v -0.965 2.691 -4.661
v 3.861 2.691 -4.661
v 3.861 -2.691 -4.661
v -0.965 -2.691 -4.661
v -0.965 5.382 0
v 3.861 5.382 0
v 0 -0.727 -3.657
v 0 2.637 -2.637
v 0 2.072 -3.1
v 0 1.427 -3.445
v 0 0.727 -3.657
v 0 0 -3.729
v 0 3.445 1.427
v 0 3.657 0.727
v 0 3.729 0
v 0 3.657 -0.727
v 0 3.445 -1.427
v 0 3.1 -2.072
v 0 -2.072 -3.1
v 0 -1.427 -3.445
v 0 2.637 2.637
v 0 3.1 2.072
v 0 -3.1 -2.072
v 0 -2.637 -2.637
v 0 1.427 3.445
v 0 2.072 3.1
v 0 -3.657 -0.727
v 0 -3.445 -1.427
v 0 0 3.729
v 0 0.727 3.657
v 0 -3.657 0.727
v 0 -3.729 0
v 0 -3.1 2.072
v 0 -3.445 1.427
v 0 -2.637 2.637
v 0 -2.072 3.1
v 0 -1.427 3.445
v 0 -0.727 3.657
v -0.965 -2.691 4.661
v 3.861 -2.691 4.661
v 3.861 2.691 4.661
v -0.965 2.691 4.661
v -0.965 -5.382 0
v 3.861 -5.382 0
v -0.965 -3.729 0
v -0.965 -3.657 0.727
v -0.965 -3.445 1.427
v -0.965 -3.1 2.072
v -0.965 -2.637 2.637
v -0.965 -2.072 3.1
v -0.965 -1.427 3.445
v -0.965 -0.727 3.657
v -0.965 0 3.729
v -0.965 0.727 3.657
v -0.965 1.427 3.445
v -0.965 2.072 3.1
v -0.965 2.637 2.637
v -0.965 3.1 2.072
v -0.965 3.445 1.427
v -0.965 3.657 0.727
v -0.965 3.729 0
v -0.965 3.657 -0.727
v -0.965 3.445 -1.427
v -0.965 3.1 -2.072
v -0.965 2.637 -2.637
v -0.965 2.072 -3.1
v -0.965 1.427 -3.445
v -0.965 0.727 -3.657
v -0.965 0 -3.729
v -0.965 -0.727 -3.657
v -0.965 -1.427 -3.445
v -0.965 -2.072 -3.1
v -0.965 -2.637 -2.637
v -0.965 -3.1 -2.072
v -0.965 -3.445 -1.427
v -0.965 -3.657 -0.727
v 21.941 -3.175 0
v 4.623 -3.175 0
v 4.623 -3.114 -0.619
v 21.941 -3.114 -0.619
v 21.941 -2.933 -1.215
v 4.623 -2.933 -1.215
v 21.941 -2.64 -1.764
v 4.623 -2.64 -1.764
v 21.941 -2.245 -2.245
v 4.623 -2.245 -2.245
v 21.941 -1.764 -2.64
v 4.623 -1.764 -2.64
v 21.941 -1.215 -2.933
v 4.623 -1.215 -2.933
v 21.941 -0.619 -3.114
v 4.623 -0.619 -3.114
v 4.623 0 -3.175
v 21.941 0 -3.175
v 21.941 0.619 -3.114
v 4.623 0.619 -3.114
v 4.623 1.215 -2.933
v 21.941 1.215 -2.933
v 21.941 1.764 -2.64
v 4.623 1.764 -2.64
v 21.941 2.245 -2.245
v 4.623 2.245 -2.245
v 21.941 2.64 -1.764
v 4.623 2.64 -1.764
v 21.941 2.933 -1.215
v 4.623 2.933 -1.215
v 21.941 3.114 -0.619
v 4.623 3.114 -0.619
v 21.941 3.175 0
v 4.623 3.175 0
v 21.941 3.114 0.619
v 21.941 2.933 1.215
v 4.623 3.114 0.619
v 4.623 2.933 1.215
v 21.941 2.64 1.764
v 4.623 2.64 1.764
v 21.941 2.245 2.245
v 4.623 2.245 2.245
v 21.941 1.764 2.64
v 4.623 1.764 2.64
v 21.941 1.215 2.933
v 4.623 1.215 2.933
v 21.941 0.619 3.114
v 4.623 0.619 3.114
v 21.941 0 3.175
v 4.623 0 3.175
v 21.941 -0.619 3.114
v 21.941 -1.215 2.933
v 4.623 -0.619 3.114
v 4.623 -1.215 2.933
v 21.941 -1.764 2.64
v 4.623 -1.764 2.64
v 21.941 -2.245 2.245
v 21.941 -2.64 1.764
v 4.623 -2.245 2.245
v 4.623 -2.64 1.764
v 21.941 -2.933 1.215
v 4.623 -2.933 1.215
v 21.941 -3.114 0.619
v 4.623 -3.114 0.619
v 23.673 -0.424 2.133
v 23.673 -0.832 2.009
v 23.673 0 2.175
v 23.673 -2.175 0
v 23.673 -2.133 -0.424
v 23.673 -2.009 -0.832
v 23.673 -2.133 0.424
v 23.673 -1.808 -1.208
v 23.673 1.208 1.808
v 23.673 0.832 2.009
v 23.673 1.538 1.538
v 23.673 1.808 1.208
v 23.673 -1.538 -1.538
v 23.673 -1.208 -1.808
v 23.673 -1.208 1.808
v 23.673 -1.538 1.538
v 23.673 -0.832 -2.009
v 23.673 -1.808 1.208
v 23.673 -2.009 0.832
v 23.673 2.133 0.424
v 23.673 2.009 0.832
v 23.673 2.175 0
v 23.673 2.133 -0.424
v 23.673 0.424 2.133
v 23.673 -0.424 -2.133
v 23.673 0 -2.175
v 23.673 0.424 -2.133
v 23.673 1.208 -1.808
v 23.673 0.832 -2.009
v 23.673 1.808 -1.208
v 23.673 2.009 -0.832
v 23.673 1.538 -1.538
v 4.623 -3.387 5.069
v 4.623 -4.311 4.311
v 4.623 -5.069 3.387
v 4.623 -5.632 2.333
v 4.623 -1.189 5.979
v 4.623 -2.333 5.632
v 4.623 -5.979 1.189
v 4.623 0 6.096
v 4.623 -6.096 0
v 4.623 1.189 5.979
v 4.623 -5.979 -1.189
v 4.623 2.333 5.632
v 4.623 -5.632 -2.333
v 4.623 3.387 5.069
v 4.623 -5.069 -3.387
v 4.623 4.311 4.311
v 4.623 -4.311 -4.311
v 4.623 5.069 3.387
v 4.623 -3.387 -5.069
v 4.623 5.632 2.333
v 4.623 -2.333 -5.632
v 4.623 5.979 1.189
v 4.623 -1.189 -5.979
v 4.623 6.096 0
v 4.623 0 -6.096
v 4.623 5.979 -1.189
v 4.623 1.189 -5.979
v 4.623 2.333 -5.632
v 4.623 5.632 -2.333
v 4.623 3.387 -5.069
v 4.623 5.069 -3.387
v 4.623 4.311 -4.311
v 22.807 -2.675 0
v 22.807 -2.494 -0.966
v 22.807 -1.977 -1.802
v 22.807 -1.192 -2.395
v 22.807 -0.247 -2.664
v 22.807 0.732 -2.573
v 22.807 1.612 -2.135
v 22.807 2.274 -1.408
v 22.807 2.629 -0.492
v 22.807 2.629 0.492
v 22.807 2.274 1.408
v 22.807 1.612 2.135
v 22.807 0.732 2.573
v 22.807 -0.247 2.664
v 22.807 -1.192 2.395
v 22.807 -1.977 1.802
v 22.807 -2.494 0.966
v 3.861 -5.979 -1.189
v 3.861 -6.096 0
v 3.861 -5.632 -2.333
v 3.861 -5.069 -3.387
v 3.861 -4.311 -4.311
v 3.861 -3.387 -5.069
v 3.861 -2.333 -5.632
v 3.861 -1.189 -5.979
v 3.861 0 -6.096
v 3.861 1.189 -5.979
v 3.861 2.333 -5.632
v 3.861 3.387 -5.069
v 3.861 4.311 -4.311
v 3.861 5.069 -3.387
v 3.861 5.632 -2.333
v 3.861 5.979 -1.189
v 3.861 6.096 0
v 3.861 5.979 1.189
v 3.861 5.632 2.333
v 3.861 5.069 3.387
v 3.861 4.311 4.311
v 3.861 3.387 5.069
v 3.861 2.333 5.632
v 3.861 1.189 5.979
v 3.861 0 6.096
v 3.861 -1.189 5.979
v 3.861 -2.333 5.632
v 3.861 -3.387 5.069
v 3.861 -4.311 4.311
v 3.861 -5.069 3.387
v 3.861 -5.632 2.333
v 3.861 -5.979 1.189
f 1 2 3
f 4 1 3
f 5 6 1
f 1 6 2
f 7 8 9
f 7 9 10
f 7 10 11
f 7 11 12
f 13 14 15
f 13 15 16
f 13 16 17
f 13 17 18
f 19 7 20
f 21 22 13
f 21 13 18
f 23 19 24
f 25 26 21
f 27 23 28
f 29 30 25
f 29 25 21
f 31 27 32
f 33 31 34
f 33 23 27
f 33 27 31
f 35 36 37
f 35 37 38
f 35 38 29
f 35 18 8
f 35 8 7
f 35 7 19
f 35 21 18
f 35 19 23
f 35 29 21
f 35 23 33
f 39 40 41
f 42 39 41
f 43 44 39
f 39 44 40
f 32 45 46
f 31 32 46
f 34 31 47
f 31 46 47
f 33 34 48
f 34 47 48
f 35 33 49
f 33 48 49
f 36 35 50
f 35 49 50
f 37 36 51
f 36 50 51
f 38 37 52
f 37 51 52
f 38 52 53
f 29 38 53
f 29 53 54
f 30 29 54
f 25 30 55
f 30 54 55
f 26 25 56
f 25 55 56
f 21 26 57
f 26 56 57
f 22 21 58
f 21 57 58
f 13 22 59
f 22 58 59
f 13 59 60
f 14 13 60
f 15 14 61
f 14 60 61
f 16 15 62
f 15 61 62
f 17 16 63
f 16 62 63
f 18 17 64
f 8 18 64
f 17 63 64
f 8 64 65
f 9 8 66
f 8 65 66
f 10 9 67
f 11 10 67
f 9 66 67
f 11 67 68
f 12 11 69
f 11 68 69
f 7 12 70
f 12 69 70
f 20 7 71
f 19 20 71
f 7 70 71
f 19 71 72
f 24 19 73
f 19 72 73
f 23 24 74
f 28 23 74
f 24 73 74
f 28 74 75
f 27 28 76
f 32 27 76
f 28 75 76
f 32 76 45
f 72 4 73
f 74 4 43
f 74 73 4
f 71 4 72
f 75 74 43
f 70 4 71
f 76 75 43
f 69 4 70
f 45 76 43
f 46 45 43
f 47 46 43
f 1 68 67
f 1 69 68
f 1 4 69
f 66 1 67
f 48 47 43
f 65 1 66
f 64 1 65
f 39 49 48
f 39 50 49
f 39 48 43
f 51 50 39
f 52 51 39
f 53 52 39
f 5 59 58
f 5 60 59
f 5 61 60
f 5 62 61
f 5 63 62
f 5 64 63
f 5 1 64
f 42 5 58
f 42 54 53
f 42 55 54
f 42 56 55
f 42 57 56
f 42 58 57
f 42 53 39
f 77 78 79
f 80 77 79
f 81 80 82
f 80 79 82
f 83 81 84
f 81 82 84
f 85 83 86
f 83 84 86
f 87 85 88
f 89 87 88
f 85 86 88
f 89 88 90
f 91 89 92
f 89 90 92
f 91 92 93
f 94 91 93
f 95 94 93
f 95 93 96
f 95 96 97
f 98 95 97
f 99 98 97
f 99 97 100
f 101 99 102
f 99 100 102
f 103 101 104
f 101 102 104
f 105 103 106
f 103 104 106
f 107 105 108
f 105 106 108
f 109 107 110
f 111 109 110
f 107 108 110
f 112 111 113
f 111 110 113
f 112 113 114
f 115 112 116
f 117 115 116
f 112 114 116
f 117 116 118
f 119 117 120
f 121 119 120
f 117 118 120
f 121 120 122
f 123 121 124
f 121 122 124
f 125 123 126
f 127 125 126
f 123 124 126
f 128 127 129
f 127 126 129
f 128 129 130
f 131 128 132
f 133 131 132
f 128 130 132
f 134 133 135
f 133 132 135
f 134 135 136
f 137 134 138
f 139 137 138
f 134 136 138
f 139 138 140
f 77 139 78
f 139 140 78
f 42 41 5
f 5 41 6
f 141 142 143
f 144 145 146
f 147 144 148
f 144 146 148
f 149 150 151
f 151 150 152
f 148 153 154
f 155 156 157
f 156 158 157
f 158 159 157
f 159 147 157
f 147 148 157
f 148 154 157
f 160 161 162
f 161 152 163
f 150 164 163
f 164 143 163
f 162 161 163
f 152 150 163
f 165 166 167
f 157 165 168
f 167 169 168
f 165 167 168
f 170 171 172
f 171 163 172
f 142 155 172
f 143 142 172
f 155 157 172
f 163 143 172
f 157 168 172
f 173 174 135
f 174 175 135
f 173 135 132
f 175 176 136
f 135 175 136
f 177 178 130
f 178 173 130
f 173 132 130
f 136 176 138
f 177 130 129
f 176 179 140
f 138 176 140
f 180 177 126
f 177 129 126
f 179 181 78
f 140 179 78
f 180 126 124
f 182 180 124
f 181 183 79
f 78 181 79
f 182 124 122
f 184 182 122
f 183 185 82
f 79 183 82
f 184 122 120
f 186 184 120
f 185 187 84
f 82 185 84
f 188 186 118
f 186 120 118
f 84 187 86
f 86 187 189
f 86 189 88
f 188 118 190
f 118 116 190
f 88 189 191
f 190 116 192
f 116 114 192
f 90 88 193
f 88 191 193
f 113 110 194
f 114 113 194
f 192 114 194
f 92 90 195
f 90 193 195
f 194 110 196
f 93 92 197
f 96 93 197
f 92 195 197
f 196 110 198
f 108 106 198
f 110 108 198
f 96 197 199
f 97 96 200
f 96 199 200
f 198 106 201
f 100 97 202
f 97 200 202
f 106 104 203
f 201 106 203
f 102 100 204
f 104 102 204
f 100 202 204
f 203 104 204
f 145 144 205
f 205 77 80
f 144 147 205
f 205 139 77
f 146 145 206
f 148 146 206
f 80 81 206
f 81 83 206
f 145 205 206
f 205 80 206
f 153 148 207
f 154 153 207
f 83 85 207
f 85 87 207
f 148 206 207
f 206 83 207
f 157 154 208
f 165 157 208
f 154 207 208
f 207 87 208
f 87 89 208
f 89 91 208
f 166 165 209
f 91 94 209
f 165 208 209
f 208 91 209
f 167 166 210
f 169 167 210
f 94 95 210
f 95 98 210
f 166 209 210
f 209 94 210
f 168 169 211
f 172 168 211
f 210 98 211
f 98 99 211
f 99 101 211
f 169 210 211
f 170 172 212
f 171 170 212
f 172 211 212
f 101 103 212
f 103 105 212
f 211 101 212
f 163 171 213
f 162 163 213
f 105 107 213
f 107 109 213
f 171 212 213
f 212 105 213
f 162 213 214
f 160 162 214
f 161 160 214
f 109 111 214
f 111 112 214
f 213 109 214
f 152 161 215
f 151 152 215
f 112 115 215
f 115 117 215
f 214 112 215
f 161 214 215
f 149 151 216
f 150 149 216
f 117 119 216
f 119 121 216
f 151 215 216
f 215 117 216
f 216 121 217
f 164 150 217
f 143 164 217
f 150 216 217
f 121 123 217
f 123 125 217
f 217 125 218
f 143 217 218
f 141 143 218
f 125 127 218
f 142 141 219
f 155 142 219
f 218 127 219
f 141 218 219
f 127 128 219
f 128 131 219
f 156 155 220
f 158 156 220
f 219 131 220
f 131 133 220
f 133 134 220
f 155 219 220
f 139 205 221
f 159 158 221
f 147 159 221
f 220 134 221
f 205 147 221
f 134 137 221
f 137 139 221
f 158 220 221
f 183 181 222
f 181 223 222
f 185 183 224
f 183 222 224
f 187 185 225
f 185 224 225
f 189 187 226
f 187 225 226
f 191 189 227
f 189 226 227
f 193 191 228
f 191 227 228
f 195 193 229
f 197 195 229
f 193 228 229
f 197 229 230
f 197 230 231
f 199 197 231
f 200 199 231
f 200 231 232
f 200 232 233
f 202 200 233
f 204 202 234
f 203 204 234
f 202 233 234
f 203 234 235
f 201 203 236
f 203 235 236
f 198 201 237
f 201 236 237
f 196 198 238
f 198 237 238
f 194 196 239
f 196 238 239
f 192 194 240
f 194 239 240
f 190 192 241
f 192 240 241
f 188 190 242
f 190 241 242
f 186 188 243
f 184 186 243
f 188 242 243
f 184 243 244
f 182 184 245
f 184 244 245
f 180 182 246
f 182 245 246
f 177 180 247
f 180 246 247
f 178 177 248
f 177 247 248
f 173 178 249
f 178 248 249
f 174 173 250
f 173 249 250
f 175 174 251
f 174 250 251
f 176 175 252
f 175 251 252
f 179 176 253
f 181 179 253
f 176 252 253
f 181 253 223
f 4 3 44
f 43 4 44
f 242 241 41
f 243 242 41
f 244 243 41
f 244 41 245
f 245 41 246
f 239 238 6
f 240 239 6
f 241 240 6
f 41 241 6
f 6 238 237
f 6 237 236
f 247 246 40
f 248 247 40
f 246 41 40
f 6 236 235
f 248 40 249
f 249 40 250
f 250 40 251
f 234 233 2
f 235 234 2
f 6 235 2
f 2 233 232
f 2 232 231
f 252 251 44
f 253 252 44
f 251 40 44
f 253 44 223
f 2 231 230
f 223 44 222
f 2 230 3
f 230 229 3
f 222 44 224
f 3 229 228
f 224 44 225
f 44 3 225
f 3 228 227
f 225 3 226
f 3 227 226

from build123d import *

# Parameters (mm, degrees)
BOSS_EXTRUDE1_DEPTH = 4.826
SKETCH3_R           = 3.72872
CUT_EXTRUDE1_DEPTH  = 0.9652
CHAMFER1_SIZE       = 1
CHAMFER1_SIZE2      = 1.732050808


with BuildPart() as part:
    # Sketch1 → Revolve1 (revolve)
    with BuildSketch(Plane.XY, mode=Mode.PRIVATE) as revolve1_sk:
        Polygon((4.6228, 6.096), (3.8608, 6.096), (3.8608, 4.6609), (-0.9652, 4.6609), (-0.9652, 0), (0, 0), (4.6228, 0), (23.6728, 0), (23.6728, 3.175), (4.6228, 3.175), align=None)
    revolve(revolve1_sk.sketch.rotate(Axis((4.6228, 0, 0), (1, 0, 0)), 180), axis=Axis((4.6228, 0, 0), (1, 0, 0)))

    # Sketch2 → Boss-Extrude1 (add)
    with BuildSketch(Plane.ZY.offset(-3.8608)):
        Polygon((0, 5.381943739), (-4.6609, 2.69097187), (-4.6609, -2.69097187), (0, -5.381943739), (4.6609, -2.69097187), (4.6609, 2.69097187), align=None)
    extrude(amount=BOSS_EXTRUDE1_DEPTH)

    # Sketch3 → Cut-Extrude1 (cut)
    with BuildSketch(Plane.ZY.offset(0.9652)):
        with Locations(Location((0, 0, 0), (0, 0, 270))):
            Circle(SKETCH3_R)
    extrude(amount=-CUT_EXTRUDE1_DEPTH, mode=Mode.SUBTRACT)

    # Chamfer1
    chamfer1_edges = [part.edges().sort_by_distance(p)[0] for p in [
        (23.6728, 3.175, 0),
    ]]
    chamfer1_side = [part.faces().sort_by_distance(p)[0] for p in [
        (23.6728, 0, 0),
    ]]
    chamfer(chamfer1_edges, length=CHAMFER1_SIZE, length2=CHAMFER1_SIZE2, reference=chamfer1_side[0])


solid = part.part
